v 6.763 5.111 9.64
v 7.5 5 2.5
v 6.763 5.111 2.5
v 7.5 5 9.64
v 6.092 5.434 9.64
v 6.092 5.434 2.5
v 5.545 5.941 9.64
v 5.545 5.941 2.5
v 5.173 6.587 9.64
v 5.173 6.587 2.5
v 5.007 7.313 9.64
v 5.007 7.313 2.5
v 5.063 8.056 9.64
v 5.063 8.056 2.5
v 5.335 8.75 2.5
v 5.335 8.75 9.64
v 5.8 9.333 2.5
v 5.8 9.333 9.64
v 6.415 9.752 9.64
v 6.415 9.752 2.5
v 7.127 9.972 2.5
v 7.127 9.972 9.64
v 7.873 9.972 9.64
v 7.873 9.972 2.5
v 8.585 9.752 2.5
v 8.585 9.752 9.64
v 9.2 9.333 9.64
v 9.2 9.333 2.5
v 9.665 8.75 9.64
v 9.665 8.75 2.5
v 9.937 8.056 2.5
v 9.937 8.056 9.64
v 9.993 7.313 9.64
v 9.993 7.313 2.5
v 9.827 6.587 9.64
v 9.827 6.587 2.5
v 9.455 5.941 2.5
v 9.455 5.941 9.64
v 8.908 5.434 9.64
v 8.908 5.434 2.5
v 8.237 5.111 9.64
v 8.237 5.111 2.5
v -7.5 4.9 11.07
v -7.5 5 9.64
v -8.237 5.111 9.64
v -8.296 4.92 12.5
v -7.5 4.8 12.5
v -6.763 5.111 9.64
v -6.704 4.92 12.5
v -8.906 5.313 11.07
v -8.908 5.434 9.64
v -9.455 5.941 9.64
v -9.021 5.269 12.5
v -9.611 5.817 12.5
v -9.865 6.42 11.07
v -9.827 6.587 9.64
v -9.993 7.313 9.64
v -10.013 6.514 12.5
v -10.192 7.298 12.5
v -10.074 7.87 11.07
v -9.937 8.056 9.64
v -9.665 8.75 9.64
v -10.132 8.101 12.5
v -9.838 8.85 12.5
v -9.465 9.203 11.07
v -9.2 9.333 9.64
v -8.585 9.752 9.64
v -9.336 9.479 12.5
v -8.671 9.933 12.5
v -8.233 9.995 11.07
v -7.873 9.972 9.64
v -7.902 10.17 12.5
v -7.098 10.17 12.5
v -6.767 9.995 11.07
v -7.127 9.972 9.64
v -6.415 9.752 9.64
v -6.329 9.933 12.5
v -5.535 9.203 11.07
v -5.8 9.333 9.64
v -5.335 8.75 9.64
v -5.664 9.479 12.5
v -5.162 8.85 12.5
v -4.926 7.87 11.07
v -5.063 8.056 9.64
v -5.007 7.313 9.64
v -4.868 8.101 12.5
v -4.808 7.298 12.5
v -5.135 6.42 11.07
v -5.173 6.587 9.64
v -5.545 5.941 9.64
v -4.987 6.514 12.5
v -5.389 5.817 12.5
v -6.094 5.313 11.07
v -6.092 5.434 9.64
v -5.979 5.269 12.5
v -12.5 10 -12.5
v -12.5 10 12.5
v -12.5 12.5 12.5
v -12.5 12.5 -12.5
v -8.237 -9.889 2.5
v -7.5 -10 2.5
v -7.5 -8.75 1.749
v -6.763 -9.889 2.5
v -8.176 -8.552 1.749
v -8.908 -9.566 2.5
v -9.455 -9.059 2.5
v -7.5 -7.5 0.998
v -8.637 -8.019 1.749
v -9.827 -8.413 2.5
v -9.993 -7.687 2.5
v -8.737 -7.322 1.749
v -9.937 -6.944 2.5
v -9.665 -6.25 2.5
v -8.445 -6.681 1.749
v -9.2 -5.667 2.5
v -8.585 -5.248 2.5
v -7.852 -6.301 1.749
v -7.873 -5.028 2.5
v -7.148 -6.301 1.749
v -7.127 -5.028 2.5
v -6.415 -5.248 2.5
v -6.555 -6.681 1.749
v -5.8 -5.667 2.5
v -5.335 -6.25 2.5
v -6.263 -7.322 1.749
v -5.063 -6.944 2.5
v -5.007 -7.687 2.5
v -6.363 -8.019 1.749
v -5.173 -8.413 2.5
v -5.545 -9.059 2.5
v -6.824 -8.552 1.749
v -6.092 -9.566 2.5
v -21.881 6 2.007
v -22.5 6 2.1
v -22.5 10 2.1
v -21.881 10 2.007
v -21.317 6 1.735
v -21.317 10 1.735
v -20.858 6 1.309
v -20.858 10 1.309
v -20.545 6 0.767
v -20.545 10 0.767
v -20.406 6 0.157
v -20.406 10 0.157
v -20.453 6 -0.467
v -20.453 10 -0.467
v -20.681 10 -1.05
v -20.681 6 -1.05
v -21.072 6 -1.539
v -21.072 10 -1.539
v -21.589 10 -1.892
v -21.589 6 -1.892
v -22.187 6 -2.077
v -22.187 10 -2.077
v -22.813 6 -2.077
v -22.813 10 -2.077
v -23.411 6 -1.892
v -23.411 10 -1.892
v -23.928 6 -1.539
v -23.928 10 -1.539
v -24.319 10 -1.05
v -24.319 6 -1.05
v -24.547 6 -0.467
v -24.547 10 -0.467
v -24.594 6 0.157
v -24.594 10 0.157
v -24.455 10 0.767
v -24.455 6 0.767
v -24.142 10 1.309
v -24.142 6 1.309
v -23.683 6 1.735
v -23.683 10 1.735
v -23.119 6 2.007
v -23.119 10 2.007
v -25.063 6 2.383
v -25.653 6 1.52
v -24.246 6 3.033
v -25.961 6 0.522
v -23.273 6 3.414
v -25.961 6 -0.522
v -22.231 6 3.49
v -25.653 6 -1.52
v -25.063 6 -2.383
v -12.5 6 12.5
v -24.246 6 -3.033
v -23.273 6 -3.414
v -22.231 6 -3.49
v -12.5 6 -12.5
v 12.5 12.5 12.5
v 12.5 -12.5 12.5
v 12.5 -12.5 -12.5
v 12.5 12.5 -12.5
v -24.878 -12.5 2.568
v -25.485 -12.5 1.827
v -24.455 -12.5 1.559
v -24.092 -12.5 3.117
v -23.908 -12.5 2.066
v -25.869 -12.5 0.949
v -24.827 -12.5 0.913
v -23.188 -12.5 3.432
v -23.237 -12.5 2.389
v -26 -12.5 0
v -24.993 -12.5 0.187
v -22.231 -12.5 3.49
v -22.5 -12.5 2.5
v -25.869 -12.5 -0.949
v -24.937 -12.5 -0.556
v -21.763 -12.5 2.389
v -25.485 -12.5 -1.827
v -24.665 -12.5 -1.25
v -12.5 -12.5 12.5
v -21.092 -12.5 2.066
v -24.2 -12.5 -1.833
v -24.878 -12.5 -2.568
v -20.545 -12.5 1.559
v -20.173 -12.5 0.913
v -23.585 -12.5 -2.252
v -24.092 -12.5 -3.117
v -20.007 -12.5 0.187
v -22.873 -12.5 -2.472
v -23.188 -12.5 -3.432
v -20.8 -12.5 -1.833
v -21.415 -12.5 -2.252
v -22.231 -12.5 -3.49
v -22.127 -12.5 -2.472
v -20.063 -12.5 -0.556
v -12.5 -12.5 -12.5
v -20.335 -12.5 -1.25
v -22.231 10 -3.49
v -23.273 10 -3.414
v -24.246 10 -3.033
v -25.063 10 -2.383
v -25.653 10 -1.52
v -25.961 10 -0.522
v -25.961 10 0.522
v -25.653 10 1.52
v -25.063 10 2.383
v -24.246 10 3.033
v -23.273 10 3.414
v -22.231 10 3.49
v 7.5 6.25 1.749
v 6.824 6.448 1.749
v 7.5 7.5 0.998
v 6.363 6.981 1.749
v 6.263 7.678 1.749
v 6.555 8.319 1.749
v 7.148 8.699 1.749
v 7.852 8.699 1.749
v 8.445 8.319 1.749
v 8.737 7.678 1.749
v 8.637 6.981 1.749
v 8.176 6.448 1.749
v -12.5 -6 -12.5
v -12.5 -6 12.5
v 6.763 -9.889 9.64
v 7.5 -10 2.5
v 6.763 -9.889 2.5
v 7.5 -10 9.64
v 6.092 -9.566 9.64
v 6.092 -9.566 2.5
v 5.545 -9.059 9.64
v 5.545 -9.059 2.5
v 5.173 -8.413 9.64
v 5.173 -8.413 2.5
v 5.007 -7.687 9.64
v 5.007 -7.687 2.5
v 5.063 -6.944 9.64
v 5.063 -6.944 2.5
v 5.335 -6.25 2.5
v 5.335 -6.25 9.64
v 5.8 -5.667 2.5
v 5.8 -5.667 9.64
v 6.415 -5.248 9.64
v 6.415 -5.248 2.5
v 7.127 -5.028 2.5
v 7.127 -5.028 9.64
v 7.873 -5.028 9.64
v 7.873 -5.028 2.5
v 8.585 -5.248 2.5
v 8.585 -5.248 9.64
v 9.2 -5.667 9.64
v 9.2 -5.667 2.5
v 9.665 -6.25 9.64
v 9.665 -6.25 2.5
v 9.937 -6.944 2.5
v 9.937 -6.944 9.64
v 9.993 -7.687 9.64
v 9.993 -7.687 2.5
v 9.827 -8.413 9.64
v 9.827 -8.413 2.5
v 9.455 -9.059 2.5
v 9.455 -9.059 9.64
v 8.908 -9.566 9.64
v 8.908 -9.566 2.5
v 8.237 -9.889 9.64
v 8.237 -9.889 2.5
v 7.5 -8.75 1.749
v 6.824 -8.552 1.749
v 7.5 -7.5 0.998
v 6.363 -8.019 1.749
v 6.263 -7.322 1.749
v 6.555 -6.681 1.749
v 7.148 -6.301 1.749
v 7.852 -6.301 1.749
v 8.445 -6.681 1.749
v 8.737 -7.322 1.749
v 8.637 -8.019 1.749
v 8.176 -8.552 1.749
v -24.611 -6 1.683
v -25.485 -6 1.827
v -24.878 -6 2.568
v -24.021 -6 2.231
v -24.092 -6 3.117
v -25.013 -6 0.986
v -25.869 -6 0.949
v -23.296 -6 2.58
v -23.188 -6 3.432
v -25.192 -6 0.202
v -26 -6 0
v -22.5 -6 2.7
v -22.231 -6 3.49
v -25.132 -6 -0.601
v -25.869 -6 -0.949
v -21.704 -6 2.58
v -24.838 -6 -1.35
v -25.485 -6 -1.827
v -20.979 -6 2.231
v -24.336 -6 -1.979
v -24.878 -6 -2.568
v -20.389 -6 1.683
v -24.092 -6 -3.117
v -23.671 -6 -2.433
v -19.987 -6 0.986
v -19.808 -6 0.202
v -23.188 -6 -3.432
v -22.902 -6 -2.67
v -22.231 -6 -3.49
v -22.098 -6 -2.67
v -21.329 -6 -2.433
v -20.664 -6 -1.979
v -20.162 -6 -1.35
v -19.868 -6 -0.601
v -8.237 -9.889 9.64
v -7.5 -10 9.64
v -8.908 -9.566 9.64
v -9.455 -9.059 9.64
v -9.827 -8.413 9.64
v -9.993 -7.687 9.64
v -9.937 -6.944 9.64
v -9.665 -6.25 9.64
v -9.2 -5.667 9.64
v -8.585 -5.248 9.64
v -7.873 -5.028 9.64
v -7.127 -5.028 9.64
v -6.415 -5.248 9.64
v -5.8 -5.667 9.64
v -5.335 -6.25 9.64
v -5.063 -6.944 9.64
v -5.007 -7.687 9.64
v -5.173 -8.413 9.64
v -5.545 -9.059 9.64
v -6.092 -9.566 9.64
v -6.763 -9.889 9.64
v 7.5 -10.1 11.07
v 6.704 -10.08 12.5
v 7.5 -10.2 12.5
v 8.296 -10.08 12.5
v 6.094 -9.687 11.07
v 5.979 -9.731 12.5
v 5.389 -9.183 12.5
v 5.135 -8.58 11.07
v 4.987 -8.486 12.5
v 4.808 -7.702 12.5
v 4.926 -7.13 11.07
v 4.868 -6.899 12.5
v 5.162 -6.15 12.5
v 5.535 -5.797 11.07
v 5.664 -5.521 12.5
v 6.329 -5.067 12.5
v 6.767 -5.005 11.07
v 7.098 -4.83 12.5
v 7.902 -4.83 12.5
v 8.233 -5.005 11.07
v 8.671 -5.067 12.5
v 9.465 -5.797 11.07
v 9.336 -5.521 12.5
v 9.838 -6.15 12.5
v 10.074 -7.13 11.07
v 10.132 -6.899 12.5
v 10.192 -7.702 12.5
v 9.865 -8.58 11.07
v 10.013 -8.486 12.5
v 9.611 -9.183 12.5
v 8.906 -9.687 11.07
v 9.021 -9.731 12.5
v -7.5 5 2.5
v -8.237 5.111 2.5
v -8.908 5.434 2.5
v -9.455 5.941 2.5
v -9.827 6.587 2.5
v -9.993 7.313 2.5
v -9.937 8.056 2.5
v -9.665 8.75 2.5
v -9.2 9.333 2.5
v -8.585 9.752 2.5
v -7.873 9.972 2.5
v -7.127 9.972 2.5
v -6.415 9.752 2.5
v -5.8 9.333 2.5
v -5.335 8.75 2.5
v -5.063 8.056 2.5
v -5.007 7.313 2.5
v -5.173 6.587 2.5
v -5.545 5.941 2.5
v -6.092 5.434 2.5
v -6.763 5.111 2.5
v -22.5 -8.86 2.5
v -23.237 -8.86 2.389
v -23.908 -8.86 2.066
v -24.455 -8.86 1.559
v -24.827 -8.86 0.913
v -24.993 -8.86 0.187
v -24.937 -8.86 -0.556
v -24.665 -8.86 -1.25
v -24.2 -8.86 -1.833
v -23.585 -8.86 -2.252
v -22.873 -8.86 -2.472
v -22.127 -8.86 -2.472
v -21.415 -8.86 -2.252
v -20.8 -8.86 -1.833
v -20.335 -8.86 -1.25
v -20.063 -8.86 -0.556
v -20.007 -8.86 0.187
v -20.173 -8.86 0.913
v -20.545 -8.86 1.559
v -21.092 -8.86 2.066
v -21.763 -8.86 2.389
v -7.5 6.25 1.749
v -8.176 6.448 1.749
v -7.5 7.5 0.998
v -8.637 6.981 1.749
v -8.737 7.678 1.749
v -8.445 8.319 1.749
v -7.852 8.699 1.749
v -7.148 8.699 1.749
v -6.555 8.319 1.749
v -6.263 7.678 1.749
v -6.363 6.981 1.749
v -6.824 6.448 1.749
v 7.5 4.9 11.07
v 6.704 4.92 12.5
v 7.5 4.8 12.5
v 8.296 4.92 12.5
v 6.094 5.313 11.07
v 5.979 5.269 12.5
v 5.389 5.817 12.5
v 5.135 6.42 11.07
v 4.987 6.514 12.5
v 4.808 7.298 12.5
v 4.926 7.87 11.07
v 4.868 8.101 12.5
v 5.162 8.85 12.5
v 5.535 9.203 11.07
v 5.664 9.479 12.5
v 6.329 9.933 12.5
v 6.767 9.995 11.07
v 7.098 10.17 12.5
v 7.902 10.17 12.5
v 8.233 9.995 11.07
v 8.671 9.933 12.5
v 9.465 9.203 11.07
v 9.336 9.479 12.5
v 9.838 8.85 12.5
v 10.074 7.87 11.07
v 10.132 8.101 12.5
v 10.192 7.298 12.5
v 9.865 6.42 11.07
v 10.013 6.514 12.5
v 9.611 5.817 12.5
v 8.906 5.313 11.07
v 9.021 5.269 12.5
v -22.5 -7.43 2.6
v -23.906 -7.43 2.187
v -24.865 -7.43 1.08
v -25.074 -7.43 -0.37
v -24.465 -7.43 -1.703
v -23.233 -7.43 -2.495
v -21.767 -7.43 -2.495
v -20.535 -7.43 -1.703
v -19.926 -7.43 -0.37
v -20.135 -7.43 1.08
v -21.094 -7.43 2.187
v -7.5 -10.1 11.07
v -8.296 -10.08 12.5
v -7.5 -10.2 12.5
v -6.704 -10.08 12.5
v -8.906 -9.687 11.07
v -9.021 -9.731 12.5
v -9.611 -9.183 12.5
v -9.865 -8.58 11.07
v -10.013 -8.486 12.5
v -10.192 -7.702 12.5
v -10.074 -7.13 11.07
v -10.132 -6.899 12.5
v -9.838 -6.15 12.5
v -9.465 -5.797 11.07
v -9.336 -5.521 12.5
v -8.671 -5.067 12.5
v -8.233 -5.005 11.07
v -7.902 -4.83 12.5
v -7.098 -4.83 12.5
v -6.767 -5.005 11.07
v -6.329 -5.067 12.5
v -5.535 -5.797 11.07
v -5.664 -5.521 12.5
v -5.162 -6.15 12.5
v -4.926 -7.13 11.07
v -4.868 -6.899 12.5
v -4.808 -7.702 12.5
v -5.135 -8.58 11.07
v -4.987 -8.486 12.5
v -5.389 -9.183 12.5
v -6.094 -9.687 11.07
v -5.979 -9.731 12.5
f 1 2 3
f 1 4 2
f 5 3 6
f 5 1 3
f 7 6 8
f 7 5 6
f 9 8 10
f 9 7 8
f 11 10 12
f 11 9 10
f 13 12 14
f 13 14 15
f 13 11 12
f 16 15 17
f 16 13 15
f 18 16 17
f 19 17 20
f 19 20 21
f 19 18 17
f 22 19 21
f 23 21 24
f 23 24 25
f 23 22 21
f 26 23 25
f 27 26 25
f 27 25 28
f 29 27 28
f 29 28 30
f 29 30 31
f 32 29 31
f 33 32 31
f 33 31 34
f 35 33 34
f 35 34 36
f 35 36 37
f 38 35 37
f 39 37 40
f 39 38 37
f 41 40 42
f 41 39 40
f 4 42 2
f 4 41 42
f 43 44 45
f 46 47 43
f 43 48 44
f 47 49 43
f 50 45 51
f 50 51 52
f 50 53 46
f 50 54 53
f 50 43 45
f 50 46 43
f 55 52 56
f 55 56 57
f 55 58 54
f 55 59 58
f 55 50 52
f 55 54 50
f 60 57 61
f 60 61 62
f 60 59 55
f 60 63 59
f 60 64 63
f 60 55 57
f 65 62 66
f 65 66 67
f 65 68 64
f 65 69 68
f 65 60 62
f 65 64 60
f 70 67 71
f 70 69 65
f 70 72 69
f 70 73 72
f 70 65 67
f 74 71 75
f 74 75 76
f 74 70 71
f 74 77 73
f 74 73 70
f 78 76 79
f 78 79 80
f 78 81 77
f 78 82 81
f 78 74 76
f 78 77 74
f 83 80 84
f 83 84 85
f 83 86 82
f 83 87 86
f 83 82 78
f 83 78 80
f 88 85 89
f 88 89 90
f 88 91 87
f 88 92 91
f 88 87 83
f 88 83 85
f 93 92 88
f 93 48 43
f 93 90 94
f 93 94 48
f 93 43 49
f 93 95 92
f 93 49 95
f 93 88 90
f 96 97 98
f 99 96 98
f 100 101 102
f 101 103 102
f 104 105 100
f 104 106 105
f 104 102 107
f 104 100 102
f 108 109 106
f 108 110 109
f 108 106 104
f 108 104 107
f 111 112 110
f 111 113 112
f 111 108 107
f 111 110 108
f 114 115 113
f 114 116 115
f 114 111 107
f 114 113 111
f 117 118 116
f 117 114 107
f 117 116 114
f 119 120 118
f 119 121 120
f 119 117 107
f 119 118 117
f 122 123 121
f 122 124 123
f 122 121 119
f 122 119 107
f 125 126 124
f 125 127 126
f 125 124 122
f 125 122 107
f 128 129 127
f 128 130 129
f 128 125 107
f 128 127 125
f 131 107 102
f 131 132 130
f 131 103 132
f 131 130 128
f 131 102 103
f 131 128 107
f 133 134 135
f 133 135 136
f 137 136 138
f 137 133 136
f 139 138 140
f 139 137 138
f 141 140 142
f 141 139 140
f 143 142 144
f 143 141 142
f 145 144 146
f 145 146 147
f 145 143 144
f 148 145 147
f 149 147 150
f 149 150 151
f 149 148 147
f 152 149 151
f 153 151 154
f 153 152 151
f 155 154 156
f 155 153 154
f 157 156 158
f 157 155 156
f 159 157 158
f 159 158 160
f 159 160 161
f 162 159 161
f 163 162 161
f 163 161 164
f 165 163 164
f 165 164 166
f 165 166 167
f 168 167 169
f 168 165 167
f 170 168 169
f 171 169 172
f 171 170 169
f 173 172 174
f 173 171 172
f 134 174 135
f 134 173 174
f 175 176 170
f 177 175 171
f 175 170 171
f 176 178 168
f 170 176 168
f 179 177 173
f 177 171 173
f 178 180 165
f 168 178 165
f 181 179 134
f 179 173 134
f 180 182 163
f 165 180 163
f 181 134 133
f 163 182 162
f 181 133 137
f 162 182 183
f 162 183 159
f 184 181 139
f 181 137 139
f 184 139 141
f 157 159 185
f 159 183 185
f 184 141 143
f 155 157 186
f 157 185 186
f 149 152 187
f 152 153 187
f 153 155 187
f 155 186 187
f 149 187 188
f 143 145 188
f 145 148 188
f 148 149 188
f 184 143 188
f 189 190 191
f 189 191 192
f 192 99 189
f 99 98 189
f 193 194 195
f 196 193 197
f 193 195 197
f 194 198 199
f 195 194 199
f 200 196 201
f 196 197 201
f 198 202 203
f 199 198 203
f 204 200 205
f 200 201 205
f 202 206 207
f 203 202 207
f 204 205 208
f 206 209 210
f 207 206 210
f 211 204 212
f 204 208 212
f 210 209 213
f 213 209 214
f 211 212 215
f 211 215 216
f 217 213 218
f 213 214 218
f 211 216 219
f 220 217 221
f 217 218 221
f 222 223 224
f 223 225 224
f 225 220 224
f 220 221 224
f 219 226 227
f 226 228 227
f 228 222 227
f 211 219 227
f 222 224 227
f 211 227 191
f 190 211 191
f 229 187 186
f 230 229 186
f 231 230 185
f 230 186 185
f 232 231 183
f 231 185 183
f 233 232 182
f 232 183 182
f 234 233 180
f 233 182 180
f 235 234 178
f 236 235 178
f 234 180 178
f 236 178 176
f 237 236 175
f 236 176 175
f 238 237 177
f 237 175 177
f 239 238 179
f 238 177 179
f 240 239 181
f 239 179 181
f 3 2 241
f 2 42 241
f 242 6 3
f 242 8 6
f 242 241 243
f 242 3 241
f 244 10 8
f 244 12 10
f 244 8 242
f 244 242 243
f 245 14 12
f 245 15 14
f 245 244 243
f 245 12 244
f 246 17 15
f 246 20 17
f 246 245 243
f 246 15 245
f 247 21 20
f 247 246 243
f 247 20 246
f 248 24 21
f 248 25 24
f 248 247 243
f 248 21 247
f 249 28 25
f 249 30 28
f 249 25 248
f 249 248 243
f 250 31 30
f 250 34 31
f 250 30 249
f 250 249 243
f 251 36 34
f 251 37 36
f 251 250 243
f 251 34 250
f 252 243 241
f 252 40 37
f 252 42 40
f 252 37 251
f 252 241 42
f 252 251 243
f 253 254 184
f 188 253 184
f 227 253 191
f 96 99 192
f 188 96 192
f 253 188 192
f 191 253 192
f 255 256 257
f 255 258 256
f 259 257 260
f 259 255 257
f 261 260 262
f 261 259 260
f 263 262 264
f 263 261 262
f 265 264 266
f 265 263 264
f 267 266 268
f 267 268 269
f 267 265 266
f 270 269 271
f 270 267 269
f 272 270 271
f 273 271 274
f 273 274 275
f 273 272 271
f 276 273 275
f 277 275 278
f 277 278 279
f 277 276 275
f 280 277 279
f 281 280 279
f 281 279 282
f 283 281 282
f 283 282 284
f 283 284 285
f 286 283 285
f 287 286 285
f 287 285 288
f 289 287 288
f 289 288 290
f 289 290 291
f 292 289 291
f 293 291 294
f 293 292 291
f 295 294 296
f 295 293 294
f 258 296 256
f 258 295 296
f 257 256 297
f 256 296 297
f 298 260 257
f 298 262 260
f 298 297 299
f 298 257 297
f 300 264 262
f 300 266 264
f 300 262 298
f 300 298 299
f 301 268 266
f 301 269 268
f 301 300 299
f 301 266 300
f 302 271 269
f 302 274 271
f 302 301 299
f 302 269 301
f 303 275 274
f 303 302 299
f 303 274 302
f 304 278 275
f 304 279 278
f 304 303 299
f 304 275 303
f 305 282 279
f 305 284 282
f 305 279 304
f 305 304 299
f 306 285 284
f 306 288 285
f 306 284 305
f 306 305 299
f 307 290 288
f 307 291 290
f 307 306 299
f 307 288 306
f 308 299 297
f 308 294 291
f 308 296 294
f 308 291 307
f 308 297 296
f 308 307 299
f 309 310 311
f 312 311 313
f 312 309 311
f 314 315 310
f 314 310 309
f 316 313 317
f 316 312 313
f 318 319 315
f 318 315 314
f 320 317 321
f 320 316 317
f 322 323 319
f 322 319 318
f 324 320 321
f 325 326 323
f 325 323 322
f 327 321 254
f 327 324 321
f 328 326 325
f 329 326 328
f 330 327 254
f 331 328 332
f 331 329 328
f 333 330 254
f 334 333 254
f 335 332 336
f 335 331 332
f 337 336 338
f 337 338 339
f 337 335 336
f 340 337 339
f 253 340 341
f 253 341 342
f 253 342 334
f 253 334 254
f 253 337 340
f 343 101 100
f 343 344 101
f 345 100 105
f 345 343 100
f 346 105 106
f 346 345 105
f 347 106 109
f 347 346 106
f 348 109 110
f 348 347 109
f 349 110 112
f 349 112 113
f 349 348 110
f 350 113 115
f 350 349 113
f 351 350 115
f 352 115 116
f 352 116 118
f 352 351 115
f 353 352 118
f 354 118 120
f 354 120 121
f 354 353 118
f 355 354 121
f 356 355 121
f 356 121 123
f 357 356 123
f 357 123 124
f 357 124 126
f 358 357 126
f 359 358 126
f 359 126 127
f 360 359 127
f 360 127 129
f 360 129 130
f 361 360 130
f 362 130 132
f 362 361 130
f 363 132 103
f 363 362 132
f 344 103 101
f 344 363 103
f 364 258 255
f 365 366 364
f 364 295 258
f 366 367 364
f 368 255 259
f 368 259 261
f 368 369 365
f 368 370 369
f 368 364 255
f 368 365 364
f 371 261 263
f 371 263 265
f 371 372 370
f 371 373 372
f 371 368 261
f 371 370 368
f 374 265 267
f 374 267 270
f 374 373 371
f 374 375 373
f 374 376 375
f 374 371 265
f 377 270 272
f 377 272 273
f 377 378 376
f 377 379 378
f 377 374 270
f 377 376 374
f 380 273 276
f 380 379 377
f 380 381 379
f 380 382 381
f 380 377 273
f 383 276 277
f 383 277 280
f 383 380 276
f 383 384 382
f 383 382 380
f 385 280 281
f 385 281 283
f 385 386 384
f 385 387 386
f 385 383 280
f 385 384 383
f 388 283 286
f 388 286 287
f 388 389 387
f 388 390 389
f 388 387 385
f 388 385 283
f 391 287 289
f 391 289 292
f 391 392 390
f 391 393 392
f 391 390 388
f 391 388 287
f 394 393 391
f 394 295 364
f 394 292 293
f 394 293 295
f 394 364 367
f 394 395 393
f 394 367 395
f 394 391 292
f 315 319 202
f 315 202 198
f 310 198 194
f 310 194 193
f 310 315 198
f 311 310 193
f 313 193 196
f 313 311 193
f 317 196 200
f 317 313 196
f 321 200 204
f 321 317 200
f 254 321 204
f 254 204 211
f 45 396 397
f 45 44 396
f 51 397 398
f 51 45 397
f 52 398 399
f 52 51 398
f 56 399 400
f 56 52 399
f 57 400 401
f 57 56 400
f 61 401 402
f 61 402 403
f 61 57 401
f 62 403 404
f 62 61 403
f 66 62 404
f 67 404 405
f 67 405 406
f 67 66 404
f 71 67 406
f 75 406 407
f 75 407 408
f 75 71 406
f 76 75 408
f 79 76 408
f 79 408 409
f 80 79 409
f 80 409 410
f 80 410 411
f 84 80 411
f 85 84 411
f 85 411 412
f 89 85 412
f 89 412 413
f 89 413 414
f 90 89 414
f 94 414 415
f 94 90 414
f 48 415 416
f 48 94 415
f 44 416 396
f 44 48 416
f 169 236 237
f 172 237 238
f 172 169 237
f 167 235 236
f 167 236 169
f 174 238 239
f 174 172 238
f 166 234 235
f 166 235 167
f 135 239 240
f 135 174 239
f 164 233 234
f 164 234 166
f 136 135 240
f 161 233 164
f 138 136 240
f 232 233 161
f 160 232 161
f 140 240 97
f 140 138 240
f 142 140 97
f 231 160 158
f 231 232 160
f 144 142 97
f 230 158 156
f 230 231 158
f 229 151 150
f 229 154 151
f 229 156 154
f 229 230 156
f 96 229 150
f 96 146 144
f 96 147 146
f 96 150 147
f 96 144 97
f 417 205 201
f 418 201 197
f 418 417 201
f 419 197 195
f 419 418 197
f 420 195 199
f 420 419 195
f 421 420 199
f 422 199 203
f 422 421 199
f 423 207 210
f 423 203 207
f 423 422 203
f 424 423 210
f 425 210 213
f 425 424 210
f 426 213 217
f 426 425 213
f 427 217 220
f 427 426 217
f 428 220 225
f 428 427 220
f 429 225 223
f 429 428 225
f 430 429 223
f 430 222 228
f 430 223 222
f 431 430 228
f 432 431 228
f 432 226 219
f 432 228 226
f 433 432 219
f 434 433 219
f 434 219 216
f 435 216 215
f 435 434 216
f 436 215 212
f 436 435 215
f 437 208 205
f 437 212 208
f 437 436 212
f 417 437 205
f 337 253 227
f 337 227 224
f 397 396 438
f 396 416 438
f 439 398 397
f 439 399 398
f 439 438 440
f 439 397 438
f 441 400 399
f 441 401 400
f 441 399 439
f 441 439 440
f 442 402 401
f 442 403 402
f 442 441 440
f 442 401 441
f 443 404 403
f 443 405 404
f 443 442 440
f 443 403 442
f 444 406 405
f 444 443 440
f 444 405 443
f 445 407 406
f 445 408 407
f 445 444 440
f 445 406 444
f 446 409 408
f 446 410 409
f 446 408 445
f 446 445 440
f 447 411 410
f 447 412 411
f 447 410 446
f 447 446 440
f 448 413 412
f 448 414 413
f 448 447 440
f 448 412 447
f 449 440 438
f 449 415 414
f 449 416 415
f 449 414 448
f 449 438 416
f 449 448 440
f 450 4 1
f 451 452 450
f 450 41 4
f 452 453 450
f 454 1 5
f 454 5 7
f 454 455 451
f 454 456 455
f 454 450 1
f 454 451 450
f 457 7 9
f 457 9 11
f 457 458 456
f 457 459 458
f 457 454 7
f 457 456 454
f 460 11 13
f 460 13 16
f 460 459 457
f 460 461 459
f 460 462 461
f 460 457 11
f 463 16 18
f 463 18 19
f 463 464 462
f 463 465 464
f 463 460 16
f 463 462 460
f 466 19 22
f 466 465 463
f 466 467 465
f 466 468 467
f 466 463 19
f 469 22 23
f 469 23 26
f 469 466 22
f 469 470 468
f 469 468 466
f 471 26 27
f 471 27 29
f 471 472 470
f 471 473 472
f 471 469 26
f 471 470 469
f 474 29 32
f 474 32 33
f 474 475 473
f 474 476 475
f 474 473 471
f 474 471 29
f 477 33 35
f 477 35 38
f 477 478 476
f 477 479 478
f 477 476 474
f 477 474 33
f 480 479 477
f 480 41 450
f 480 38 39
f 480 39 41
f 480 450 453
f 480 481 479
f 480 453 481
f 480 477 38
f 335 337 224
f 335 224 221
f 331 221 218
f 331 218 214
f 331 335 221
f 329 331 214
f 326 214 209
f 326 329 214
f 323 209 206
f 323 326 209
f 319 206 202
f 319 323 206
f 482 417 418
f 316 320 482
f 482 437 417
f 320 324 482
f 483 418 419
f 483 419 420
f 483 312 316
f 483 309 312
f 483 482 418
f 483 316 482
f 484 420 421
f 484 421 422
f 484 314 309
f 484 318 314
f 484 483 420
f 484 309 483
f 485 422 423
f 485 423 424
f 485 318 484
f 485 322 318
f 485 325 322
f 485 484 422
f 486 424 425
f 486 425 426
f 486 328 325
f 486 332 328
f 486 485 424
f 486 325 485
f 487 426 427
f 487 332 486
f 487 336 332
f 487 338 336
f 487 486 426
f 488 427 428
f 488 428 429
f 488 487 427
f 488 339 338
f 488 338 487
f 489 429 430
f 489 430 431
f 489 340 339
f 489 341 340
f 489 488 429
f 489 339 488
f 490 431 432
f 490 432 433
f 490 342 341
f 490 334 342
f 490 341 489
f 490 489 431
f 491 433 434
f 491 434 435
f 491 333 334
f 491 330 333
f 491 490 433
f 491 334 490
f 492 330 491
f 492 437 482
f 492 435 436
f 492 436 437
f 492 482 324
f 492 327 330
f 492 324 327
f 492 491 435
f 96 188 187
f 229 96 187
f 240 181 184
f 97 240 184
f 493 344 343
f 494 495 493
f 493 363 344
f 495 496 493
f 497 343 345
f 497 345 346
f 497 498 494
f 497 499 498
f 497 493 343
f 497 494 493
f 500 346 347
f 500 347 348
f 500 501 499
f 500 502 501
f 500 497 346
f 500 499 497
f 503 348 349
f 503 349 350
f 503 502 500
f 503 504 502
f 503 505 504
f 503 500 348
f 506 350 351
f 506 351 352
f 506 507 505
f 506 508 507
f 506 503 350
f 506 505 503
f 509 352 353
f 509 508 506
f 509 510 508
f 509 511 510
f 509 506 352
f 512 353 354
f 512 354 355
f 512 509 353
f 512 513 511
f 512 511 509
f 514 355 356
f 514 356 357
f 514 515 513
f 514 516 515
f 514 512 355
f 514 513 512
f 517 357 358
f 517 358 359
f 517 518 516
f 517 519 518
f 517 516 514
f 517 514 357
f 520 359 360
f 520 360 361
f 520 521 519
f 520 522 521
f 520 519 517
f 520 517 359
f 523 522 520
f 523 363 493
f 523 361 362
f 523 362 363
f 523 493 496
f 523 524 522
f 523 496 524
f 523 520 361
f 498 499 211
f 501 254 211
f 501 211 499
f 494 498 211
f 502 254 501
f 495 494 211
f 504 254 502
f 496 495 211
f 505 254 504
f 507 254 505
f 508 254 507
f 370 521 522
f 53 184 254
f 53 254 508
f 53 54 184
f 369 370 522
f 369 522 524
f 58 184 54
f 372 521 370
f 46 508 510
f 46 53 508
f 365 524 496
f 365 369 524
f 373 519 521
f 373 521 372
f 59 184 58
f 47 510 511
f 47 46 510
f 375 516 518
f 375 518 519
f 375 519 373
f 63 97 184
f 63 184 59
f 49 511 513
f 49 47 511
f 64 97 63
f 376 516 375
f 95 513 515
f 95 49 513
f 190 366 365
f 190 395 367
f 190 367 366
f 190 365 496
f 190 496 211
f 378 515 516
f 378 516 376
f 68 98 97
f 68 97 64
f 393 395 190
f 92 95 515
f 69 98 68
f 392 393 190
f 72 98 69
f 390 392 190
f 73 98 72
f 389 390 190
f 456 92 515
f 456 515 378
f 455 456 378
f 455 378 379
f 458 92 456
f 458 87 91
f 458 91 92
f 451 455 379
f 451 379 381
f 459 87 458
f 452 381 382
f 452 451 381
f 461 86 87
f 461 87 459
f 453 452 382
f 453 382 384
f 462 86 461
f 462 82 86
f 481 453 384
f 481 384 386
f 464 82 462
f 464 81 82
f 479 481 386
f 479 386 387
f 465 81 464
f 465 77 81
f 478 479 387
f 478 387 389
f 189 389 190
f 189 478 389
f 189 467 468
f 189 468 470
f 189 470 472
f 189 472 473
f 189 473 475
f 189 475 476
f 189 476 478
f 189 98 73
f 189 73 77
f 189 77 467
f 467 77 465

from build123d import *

# Parameters (mm, degrees)
SKETCH1_W                = 25
SKETCH1_H                = 25
BOSS_EXTRUDE1_DEPTH      = 12.5
BOSS_EXTRUDE1_DEPTH_BACK = 12.5
LPATTERN1_COUNT          = 2
LPATTERN1_PITCH          = 15
LPATTERN1_COUNT_DIR2     = 2
LPATTERN1_PITCH_DIR2     = 15
BOSS_EXTRUDE3_START      = 6
SKETCH4_R                = 2.1
BOSS_EXTRUDE3_DEPTH      = 4
BOSS_EXTRUDE5_START      = -6
SKETCH4_5_R              = 2.1
SKETCH4_5_R_2            = 3.5
BOSS_EXTRUDE5_DEPTH      = 6.5


with BuildPart() as part:
    # Sketch1 → Boss-Extrude1 (new, two sides)
    with BuildSketch(Plane.XY) as boss_extrude1_sk:
        Rectangle(SKETCH1_W, SKETCH1_H)
    extrude(amount=BOSS_EXTRUDE1_DEPTH)
    extrude(boss_extrude1_sk.sketch, amount=-BOSS_EXTRUDE1_DEPTH_BACK)

    # Sketch3 → CSK for M3 Oval Head Machine Screw1 (revolve, cut)
    with BuildSketch(Plane(origin=(-7.5, 7.5, 12.5), x_dir=(0, -1, 0), z_dir=(1, 0, 0))):
        Polygon((0, 0), (0, 11.502151548), (2.5, 10), (2.5, 2.860133251), (2.7, 0), align=None)
    csk_for_m3_oval_head_machine_screw1 = revolve(axis=Axis((-7.5, 7.5, 18.85), (0, 0, -1)), mode=Mode.SUBTRACT)

    # LPattern1: CSK for M3 Oval Head Machine Screw1 2 × 2
    with Locations(*[(j * LPATTERN1_PITCH_DIR2, -i * LPATTERN1_PITCH, 0) for i in range(LPATTERN1_COUNT) for j in range(LPATTERN1_COUNT_DIR2) if (i, j) != (0, 0)]):
        add(csk_for_m3_oval_head_machine_screw1, mode=Mode.SUBTRACT)

    # Sketch4 → Boss-Extrude3 (add)
    with BuildSketch(Plane(origin=(0, 0, 0), x_dir=(1, 0, 0), z_dir=(0, 1, 0)).offset(BOSS_EXTRUDE3_START)):
        with BuildLine():
            Line((-22.231166913, -3.489660266), (-12.5, -12.5))
            Line((-12.5, -12.5), (-12.5, 12.5))
            Line((-12.5, 12.5), (-22.231166913, 3.489660266))
            ThreePointArc((-22.231166913, 3.489660266), (-26, 0), (-22.231166913, -3.489660266))
        make_face()
        with Locations(Location((-22.5, 0, 0), (0, 0, 270))):
            Circle(SKETCH4_R, mode=Mode.SUBTRACT)
    extrude(amount=BOSS_EXTRUDE3_DEPTH)

    # Sketch4<5> → Boss-Extrude5 (add)
    with BuildSketch(Plane(origin=(0, 0, 0), x_dir=(1, 0, 0), z_dir=(0, 1, 0)).offset(BOSS_EXTRUDE5_START)):
        with BuildLine():
            ThreePointArc((-22.231166913, 3.489660266), (-24.87792811, 2.568162359), (-26, 0))
            Line((-26, 0), (-22.231166913, 3.489660266))
        make_face()
        with BuildLine():
            Line((-22.231166913, 3.489660266), (-26, 0))
            Line((-26, 0), (-22.231166913, -3.489660266))
            ThreePointArc((-22.231166913, -3.489660266), (-19.931837641, -2.37792811), (-19, 0))
            ThreePointArc((-19, 0), (-19.931837641, 2.37792811), (-22.231166913, 3.489660266))
        make_face()
        with Locations(Location((-22.5, 0, 0), (0, 0, 270))):
            Circle(SKETCH4_5_R, mode=Mode.SUBTRACT)
        with BuildLine():
            Line((-22.231166913, -3.489660266), (-26, 0))
            ThreePointArc((-26, 0), (-24.87792811, -2.568162359), (-22.231166913, -3.489660266))
        make_face()
        with Locations(Location((-22.5, 0, 0), (0, 0, 270))):
            Circle(SKETCH4_5_R)
        with Locations((-22.5, 0)):
            Circle(SKETCH4_5_R_2)
        Polygon((-26, 0), (-12.5, -12.5), (-12.5, 12.5), align=None)
    extrude(amount=-BOSS_EXTRUDE5_DEPTH)

    # Sketch8 → CSK for M3 Oval Head Machine Screw3 (revolve, cut)
    with BuildSketch(Plane(origin=(-22.5, -6, 0), x_dir=(0, 0, 1), z_dir=(1, 0, 0))):
        Polygon((0, 0), (0, 11.502151548), (2.5, 10), (2.5, 2.860133251), (2.7, 0), align=None)
    revolve(axis=Axis((-22.5, 0.35, 0), (0, -1, 0)), mode=Mode.SUBTRACT)


solid = part.part
